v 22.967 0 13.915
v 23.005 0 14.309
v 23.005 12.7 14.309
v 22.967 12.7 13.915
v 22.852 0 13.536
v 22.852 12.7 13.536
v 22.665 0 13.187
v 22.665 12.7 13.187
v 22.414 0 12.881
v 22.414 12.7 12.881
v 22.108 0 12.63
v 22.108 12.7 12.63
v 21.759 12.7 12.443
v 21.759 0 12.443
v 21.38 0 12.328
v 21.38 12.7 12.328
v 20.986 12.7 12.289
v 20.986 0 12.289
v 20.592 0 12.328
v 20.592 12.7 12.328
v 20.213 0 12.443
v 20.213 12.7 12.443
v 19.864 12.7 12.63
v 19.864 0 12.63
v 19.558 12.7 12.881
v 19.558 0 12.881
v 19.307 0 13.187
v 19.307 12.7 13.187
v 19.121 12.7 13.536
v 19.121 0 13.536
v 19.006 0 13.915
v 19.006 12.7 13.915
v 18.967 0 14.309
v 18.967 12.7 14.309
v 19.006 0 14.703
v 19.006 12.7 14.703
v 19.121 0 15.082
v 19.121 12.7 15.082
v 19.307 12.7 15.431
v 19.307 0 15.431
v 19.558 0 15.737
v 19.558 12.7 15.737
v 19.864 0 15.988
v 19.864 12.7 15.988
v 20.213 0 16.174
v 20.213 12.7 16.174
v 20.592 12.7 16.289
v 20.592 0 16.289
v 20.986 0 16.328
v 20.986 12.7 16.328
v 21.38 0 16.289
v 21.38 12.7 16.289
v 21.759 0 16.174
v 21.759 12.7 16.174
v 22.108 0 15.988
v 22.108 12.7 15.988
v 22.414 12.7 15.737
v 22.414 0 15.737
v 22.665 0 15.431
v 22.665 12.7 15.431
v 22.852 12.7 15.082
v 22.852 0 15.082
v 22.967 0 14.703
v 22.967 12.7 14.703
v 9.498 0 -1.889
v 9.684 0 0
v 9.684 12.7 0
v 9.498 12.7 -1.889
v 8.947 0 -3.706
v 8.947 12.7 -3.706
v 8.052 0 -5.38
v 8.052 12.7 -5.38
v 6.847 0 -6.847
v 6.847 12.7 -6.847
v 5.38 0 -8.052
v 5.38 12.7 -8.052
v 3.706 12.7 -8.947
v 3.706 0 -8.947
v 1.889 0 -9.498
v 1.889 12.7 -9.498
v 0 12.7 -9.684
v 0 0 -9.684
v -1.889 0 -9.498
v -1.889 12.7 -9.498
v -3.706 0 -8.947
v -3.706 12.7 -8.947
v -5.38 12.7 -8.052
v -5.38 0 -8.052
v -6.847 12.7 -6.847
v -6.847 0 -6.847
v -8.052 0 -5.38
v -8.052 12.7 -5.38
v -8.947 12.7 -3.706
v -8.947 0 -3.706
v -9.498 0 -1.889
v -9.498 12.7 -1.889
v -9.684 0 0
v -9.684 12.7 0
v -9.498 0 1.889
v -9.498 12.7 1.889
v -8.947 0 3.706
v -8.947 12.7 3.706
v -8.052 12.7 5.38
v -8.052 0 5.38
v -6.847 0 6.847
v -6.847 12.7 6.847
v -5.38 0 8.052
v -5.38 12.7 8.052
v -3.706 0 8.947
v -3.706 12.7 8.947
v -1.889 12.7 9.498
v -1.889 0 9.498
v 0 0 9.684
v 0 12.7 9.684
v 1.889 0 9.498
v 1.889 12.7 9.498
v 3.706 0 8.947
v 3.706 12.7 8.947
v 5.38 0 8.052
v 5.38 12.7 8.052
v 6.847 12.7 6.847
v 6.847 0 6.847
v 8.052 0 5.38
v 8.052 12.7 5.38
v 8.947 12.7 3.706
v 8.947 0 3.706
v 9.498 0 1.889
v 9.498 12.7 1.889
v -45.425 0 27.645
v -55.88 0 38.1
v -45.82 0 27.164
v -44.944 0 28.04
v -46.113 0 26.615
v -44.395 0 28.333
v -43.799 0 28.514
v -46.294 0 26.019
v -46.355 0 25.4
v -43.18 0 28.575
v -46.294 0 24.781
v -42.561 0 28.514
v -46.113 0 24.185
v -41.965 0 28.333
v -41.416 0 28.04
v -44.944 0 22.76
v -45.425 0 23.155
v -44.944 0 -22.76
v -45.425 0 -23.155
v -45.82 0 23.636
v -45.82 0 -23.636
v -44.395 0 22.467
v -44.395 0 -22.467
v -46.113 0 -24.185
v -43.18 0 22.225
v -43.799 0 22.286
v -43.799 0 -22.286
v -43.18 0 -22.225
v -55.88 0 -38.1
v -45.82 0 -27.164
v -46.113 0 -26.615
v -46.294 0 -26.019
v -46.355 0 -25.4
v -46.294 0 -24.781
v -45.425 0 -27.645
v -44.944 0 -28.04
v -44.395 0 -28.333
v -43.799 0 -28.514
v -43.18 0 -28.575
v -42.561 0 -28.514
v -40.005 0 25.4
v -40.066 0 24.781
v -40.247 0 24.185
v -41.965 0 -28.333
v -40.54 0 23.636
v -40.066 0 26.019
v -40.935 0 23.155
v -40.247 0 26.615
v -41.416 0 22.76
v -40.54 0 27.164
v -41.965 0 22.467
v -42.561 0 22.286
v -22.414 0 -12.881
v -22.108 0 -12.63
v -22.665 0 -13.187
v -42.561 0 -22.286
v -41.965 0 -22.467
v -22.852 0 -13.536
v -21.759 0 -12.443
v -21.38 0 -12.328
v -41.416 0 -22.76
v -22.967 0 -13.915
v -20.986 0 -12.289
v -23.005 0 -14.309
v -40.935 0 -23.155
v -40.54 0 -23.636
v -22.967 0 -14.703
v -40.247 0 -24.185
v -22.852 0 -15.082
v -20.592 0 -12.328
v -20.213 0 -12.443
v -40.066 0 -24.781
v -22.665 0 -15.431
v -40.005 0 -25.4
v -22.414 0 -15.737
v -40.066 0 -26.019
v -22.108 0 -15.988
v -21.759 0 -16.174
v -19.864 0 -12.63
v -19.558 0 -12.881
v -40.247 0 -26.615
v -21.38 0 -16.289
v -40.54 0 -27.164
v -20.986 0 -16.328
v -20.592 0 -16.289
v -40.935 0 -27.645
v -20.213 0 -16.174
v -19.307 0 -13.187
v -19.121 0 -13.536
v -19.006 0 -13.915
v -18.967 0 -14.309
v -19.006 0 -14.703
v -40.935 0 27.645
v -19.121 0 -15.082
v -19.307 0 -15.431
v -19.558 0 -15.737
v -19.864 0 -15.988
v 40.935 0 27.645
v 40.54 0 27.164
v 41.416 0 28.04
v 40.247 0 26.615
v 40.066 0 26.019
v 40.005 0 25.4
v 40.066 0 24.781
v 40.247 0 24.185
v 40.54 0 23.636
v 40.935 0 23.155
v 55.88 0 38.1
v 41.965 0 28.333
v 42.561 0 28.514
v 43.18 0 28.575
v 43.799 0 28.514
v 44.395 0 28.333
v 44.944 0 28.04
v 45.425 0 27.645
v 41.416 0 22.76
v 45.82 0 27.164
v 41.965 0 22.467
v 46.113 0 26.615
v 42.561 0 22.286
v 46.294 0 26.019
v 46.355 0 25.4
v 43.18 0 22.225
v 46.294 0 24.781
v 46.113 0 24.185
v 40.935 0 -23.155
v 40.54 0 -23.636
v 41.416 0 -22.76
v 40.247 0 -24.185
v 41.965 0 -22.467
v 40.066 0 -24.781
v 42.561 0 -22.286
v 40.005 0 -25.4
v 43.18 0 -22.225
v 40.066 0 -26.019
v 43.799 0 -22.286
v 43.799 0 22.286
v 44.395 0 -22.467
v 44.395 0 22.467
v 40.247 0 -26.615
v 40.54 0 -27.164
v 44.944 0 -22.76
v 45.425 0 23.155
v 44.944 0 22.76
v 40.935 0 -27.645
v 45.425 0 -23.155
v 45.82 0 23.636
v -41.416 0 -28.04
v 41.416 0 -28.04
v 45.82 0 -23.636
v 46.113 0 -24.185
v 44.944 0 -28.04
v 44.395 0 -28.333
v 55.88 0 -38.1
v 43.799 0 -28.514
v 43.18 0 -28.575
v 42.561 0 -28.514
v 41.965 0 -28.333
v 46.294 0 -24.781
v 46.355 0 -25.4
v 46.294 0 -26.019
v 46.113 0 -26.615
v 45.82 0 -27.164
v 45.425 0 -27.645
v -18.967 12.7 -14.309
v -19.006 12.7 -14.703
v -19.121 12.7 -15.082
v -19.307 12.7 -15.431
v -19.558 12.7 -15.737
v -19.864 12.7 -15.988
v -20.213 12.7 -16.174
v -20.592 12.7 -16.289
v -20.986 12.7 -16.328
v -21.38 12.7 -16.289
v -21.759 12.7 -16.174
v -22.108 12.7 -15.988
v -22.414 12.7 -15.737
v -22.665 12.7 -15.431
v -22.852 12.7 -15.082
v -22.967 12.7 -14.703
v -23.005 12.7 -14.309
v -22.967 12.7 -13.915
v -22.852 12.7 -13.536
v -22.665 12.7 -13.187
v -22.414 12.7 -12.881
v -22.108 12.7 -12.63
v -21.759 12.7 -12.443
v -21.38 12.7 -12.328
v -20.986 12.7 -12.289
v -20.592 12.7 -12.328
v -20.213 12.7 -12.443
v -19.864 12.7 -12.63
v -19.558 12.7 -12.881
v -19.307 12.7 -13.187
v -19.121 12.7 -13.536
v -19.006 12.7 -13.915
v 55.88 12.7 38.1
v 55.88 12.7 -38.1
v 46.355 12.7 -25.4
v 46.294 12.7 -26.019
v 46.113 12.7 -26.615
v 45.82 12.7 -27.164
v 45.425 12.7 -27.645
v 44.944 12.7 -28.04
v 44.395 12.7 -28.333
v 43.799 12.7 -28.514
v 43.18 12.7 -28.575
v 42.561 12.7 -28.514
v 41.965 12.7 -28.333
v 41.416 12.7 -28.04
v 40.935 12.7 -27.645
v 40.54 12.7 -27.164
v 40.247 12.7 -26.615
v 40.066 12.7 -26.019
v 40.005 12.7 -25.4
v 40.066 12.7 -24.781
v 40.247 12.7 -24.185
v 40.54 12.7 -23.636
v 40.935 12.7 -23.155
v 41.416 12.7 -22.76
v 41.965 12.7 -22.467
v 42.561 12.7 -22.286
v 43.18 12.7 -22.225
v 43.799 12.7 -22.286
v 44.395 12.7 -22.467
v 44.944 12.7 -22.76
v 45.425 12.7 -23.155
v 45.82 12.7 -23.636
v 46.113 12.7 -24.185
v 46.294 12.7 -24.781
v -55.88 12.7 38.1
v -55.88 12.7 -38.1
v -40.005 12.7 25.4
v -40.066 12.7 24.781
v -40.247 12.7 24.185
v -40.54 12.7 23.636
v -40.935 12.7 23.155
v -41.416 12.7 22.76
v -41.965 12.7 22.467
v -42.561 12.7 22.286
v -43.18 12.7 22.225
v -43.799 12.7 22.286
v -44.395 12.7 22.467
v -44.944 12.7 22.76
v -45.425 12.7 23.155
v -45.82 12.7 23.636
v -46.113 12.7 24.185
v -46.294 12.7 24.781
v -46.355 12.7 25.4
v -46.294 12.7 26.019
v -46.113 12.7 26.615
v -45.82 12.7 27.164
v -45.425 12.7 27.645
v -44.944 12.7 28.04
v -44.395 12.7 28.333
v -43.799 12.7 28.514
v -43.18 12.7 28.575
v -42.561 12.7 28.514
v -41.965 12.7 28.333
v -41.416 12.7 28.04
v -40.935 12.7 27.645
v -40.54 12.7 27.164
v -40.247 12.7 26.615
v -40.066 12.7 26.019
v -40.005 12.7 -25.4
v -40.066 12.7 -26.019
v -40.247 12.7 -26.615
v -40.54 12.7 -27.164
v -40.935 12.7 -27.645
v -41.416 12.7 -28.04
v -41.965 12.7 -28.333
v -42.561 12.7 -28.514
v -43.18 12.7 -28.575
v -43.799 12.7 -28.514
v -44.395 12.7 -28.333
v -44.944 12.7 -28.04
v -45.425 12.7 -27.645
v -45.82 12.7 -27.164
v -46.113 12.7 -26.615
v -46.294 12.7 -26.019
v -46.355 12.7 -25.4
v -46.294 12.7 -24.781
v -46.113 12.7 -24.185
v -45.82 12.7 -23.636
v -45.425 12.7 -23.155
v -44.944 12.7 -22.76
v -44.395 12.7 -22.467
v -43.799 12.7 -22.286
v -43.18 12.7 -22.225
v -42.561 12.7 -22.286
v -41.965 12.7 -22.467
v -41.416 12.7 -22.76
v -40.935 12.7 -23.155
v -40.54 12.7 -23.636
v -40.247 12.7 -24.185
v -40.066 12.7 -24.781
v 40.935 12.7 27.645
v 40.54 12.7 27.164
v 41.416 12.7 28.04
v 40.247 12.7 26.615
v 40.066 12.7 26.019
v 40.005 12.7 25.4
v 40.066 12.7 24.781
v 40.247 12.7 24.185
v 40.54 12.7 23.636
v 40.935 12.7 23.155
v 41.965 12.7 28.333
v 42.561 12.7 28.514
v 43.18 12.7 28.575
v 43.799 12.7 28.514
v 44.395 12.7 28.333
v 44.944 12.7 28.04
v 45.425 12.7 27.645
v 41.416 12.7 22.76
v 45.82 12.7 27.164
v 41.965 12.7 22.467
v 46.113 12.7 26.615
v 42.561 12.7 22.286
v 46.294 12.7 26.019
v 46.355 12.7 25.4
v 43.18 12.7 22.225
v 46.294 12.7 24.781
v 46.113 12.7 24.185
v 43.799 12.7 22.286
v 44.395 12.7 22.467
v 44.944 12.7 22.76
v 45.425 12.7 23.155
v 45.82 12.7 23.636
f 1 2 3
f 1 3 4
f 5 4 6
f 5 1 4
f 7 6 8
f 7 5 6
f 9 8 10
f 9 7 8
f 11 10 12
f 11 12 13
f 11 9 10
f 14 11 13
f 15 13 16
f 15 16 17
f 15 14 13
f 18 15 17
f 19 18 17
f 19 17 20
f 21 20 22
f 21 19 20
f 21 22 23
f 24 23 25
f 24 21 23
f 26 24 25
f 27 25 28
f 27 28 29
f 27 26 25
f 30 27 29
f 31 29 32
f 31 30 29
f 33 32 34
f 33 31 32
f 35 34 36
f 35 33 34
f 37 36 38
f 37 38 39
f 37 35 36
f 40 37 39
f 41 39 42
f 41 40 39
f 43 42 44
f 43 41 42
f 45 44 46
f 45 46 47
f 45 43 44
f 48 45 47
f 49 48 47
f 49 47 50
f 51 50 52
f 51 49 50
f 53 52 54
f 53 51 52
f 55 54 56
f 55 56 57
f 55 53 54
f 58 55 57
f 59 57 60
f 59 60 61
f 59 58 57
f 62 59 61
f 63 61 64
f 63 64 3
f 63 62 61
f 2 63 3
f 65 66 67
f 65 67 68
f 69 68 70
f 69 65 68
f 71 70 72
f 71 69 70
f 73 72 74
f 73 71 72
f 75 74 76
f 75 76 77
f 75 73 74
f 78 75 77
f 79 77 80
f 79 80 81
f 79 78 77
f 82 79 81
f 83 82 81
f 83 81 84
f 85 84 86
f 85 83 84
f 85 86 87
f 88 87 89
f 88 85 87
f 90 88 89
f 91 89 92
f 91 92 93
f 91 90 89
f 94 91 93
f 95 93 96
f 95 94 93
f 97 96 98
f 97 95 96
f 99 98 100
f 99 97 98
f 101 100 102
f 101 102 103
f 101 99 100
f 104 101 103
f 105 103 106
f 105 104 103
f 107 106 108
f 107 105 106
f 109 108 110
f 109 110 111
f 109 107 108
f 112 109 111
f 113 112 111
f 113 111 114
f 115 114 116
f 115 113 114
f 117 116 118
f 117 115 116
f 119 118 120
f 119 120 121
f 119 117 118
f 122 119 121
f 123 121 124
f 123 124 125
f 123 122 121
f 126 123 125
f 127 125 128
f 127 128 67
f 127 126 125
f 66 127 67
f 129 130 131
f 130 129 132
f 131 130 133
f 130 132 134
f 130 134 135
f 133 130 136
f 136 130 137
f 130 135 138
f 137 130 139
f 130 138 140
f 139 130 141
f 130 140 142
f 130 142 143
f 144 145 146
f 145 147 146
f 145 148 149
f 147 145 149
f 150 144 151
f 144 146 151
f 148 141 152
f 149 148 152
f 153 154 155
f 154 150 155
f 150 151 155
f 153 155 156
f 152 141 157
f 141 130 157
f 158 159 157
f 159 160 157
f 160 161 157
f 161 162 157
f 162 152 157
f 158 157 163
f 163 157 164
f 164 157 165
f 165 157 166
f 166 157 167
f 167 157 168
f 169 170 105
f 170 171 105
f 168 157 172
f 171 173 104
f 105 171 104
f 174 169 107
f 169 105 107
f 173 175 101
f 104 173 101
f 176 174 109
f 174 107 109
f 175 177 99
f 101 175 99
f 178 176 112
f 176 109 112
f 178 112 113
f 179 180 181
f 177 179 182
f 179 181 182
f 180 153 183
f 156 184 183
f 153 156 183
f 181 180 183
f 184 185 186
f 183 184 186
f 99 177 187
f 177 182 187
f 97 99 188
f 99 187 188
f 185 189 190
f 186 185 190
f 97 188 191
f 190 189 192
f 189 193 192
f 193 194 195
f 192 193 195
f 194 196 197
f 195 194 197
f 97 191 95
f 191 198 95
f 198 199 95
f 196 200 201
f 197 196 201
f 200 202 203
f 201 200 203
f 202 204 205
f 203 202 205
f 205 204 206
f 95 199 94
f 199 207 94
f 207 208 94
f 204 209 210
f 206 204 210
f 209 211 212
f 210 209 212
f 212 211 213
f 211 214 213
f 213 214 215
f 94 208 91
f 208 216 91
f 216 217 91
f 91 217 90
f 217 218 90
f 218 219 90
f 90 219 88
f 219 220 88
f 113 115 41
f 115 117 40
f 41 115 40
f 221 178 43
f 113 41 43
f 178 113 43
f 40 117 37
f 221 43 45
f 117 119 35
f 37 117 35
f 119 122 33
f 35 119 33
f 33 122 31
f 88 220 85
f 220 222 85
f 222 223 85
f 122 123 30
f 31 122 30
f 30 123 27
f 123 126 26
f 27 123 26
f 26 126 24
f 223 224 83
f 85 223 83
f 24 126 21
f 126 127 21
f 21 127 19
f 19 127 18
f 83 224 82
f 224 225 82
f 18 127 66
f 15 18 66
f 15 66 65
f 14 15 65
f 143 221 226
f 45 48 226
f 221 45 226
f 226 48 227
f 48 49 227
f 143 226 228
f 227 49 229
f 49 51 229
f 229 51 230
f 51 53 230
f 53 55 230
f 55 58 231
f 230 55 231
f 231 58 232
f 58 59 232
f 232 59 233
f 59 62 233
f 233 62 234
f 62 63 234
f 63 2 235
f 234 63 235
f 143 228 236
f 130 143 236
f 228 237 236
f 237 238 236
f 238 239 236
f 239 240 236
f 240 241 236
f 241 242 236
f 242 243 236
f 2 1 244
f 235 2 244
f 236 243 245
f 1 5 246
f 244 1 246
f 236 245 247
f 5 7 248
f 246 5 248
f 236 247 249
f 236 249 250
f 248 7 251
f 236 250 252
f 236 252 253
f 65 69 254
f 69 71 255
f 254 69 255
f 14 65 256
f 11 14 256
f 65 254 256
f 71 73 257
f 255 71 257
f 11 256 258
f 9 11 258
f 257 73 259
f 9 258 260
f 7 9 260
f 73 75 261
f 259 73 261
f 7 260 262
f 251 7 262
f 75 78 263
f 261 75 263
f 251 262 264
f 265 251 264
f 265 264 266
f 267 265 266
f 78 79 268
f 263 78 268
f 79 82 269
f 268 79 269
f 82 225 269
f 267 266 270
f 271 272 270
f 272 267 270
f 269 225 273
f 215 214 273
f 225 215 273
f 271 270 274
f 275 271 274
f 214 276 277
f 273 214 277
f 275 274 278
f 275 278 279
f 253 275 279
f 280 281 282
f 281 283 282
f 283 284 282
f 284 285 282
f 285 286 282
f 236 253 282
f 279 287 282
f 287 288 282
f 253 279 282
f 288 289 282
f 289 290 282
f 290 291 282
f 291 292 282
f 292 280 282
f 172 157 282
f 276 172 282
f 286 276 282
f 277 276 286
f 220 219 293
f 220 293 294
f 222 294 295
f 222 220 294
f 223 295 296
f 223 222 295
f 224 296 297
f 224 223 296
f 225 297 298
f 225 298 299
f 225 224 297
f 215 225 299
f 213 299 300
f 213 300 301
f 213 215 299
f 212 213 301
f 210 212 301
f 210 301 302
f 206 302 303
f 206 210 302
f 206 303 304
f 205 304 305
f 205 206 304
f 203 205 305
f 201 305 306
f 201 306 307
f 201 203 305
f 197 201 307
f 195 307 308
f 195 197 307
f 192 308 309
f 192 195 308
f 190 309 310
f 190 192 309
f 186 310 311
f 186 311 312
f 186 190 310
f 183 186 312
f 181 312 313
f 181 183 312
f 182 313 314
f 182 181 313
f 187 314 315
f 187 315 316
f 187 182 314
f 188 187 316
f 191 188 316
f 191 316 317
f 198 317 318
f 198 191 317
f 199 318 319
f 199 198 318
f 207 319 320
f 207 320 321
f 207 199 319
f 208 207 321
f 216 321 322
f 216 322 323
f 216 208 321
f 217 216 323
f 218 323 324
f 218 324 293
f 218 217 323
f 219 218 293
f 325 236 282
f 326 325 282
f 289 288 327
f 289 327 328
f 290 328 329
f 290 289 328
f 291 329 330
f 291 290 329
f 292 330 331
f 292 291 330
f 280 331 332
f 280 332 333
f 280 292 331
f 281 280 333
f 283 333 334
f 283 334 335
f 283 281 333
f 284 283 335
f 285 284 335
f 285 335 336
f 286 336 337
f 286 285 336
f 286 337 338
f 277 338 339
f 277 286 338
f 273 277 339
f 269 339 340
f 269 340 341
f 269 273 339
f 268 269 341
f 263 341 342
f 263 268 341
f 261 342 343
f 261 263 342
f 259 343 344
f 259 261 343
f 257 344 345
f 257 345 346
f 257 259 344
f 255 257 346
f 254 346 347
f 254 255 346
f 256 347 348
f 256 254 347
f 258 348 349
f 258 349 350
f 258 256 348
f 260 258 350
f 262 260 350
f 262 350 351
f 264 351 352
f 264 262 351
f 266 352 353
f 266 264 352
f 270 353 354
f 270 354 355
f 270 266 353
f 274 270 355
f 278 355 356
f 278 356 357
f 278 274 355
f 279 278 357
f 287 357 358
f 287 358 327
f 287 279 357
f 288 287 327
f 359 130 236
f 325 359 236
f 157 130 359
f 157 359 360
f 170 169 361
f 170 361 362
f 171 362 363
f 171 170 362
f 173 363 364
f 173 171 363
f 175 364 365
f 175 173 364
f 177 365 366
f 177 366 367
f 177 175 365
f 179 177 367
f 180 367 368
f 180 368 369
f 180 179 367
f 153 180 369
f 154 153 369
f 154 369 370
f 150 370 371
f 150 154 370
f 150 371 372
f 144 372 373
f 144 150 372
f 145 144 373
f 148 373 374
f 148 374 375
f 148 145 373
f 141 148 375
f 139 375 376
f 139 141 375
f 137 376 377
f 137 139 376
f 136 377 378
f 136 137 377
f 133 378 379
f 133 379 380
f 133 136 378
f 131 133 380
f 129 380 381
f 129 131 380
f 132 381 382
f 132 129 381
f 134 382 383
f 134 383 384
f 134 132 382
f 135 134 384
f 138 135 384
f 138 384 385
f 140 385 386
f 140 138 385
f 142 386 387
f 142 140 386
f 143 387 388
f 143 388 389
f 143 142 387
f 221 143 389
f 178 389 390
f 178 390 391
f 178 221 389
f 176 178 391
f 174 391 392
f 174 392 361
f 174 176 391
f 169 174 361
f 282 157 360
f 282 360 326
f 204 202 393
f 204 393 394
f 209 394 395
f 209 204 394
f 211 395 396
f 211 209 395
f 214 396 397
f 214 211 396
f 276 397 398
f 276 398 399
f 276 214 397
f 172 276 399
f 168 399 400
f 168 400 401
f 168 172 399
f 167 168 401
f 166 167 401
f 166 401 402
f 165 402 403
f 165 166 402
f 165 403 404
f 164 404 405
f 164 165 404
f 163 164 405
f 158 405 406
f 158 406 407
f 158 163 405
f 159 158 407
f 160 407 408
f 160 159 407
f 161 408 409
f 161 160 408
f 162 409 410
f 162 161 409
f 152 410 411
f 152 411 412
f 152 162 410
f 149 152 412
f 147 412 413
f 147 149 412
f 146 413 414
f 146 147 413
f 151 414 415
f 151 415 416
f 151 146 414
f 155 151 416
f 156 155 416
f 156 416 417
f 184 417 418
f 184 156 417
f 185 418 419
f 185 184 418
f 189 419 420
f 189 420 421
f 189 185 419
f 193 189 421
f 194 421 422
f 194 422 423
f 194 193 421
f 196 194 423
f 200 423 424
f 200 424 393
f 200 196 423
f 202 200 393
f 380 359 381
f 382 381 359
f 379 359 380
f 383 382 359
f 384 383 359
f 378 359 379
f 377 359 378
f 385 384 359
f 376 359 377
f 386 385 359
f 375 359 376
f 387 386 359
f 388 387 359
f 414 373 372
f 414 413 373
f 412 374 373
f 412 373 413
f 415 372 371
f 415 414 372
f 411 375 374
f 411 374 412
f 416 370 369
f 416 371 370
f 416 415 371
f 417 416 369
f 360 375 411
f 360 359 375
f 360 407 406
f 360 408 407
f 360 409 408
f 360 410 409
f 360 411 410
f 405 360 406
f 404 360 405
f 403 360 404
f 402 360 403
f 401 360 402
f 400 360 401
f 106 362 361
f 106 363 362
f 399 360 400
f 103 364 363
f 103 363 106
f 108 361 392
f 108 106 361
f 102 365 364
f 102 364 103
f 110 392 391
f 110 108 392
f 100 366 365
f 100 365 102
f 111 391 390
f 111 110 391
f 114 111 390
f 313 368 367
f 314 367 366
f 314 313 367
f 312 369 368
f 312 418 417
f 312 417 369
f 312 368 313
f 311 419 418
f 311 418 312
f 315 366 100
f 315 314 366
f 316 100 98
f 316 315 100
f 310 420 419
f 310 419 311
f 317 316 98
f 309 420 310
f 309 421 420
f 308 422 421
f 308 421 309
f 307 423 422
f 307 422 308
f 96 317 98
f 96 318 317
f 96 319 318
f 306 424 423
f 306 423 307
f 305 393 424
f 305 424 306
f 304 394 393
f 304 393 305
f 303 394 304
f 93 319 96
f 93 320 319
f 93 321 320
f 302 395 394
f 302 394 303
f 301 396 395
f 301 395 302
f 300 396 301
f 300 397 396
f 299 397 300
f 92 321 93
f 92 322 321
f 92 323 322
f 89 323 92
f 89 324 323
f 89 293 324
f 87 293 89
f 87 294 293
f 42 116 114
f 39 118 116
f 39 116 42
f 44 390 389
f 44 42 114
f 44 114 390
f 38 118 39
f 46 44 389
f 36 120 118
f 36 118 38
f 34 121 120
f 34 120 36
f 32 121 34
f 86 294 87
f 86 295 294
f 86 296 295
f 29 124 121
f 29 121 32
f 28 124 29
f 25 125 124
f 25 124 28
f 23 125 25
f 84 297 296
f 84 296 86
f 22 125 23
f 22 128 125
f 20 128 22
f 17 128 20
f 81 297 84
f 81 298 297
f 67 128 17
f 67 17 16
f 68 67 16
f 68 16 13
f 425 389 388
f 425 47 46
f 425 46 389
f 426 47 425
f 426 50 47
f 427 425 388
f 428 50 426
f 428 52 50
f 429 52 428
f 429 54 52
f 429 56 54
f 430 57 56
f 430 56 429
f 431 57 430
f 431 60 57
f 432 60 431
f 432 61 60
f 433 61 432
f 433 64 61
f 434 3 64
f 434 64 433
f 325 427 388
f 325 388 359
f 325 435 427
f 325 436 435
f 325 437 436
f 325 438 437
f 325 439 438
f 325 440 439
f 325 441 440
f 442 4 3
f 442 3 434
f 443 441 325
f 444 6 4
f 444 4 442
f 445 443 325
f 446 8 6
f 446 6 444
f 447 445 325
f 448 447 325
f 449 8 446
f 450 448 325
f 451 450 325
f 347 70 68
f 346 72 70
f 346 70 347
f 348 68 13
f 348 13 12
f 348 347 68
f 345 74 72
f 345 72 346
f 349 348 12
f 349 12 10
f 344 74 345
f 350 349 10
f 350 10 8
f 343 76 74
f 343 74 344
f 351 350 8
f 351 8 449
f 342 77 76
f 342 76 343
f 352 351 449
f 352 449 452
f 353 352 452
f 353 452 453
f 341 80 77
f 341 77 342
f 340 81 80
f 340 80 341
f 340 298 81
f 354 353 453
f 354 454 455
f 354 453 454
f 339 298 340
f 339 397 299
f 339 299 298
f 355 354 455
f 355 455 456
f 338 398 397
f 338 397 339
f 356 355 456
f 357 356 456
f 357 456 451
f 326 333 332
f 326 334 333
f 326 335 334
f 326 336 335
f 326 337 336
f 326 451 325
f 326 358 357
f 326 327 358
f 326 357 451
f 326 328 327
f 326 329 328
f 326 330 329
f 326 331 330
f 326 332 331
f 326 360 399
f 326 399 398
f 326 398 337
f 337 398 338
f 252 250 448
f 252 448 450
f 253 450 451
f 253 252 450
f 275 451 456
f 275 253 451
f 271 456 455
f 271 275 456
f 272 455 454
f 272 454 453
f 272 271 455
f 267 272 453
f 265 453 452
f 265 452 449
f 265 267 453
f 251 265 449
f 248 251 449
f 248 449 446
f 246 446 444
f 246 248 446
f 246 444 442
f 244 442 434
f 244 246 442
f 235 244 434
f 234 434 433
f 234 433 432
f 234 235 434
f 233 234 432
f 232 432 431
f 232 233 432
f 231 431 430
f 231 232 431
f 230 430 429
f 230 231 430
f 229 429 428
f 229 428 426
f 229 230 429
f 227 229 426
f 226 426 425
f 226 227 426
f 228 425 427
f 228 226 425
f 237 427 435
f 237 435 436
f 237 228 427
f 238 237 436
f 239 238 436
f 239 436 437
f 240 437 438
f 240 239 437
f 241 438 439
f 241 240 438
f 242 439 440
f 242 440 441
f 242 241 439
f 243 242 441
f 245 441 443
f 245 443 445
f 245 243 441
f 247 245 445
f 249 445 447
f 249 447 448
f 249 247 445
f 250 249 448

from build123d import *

# Parameters (mm, degrees)
SKETCH1_W           = 111.76
SKETCH1_H           = 76.2
SKETCH1_R           = 9.68375
SKETCH1_R_2         = 2.0193
SKETCH1_R_3         = 3.175
BOSS_EXTRUDE1_DEPTH = 12.7


with BuildPart() as part:
    # Sketch1 → Boss-Extrude1 (new body)
    with BuildSketch(Plane(origin=(0, 0, 0), x_dir=(1, 0, 0), z_dir=(0, 1, 0))):
        Rectangle(SKETCH1_W, SKETCH1_H)
        Circle(SKETCH1_R, mode=Mode.SUBTRACT)
        with Locations((-20.986174507, 14.308755346)):
            Circle(SKETCH1_R_2, mode=Mode.SUBTRACT)
        with Locations((20.986174507, -14.308755346)):
            Circle(SKETCH1_R_2, mode=Mode.SUBTRACT)
        with Locations((-43.18, 25.4)):
            Circle(SKETCH1_R_3, mode=Mode.SUBTRACT)
        with Locations((-43.18, -25.4)):
            Circle(SKETCH1_R_3, mode=Mode.SUBTRACT)
        with Locations((43.18, -25.4)):
            Circle(SKETCH1_R_3, mode=Mode.SUBTRACT)
        with Locations((43.18, 25.4)):
            Circle(SKETCH1_R_3, mode=Mode.SUBTRACT)
    extrude(amount=BOSS_EXTRUDE1_DEPTH)


solid = part.part
